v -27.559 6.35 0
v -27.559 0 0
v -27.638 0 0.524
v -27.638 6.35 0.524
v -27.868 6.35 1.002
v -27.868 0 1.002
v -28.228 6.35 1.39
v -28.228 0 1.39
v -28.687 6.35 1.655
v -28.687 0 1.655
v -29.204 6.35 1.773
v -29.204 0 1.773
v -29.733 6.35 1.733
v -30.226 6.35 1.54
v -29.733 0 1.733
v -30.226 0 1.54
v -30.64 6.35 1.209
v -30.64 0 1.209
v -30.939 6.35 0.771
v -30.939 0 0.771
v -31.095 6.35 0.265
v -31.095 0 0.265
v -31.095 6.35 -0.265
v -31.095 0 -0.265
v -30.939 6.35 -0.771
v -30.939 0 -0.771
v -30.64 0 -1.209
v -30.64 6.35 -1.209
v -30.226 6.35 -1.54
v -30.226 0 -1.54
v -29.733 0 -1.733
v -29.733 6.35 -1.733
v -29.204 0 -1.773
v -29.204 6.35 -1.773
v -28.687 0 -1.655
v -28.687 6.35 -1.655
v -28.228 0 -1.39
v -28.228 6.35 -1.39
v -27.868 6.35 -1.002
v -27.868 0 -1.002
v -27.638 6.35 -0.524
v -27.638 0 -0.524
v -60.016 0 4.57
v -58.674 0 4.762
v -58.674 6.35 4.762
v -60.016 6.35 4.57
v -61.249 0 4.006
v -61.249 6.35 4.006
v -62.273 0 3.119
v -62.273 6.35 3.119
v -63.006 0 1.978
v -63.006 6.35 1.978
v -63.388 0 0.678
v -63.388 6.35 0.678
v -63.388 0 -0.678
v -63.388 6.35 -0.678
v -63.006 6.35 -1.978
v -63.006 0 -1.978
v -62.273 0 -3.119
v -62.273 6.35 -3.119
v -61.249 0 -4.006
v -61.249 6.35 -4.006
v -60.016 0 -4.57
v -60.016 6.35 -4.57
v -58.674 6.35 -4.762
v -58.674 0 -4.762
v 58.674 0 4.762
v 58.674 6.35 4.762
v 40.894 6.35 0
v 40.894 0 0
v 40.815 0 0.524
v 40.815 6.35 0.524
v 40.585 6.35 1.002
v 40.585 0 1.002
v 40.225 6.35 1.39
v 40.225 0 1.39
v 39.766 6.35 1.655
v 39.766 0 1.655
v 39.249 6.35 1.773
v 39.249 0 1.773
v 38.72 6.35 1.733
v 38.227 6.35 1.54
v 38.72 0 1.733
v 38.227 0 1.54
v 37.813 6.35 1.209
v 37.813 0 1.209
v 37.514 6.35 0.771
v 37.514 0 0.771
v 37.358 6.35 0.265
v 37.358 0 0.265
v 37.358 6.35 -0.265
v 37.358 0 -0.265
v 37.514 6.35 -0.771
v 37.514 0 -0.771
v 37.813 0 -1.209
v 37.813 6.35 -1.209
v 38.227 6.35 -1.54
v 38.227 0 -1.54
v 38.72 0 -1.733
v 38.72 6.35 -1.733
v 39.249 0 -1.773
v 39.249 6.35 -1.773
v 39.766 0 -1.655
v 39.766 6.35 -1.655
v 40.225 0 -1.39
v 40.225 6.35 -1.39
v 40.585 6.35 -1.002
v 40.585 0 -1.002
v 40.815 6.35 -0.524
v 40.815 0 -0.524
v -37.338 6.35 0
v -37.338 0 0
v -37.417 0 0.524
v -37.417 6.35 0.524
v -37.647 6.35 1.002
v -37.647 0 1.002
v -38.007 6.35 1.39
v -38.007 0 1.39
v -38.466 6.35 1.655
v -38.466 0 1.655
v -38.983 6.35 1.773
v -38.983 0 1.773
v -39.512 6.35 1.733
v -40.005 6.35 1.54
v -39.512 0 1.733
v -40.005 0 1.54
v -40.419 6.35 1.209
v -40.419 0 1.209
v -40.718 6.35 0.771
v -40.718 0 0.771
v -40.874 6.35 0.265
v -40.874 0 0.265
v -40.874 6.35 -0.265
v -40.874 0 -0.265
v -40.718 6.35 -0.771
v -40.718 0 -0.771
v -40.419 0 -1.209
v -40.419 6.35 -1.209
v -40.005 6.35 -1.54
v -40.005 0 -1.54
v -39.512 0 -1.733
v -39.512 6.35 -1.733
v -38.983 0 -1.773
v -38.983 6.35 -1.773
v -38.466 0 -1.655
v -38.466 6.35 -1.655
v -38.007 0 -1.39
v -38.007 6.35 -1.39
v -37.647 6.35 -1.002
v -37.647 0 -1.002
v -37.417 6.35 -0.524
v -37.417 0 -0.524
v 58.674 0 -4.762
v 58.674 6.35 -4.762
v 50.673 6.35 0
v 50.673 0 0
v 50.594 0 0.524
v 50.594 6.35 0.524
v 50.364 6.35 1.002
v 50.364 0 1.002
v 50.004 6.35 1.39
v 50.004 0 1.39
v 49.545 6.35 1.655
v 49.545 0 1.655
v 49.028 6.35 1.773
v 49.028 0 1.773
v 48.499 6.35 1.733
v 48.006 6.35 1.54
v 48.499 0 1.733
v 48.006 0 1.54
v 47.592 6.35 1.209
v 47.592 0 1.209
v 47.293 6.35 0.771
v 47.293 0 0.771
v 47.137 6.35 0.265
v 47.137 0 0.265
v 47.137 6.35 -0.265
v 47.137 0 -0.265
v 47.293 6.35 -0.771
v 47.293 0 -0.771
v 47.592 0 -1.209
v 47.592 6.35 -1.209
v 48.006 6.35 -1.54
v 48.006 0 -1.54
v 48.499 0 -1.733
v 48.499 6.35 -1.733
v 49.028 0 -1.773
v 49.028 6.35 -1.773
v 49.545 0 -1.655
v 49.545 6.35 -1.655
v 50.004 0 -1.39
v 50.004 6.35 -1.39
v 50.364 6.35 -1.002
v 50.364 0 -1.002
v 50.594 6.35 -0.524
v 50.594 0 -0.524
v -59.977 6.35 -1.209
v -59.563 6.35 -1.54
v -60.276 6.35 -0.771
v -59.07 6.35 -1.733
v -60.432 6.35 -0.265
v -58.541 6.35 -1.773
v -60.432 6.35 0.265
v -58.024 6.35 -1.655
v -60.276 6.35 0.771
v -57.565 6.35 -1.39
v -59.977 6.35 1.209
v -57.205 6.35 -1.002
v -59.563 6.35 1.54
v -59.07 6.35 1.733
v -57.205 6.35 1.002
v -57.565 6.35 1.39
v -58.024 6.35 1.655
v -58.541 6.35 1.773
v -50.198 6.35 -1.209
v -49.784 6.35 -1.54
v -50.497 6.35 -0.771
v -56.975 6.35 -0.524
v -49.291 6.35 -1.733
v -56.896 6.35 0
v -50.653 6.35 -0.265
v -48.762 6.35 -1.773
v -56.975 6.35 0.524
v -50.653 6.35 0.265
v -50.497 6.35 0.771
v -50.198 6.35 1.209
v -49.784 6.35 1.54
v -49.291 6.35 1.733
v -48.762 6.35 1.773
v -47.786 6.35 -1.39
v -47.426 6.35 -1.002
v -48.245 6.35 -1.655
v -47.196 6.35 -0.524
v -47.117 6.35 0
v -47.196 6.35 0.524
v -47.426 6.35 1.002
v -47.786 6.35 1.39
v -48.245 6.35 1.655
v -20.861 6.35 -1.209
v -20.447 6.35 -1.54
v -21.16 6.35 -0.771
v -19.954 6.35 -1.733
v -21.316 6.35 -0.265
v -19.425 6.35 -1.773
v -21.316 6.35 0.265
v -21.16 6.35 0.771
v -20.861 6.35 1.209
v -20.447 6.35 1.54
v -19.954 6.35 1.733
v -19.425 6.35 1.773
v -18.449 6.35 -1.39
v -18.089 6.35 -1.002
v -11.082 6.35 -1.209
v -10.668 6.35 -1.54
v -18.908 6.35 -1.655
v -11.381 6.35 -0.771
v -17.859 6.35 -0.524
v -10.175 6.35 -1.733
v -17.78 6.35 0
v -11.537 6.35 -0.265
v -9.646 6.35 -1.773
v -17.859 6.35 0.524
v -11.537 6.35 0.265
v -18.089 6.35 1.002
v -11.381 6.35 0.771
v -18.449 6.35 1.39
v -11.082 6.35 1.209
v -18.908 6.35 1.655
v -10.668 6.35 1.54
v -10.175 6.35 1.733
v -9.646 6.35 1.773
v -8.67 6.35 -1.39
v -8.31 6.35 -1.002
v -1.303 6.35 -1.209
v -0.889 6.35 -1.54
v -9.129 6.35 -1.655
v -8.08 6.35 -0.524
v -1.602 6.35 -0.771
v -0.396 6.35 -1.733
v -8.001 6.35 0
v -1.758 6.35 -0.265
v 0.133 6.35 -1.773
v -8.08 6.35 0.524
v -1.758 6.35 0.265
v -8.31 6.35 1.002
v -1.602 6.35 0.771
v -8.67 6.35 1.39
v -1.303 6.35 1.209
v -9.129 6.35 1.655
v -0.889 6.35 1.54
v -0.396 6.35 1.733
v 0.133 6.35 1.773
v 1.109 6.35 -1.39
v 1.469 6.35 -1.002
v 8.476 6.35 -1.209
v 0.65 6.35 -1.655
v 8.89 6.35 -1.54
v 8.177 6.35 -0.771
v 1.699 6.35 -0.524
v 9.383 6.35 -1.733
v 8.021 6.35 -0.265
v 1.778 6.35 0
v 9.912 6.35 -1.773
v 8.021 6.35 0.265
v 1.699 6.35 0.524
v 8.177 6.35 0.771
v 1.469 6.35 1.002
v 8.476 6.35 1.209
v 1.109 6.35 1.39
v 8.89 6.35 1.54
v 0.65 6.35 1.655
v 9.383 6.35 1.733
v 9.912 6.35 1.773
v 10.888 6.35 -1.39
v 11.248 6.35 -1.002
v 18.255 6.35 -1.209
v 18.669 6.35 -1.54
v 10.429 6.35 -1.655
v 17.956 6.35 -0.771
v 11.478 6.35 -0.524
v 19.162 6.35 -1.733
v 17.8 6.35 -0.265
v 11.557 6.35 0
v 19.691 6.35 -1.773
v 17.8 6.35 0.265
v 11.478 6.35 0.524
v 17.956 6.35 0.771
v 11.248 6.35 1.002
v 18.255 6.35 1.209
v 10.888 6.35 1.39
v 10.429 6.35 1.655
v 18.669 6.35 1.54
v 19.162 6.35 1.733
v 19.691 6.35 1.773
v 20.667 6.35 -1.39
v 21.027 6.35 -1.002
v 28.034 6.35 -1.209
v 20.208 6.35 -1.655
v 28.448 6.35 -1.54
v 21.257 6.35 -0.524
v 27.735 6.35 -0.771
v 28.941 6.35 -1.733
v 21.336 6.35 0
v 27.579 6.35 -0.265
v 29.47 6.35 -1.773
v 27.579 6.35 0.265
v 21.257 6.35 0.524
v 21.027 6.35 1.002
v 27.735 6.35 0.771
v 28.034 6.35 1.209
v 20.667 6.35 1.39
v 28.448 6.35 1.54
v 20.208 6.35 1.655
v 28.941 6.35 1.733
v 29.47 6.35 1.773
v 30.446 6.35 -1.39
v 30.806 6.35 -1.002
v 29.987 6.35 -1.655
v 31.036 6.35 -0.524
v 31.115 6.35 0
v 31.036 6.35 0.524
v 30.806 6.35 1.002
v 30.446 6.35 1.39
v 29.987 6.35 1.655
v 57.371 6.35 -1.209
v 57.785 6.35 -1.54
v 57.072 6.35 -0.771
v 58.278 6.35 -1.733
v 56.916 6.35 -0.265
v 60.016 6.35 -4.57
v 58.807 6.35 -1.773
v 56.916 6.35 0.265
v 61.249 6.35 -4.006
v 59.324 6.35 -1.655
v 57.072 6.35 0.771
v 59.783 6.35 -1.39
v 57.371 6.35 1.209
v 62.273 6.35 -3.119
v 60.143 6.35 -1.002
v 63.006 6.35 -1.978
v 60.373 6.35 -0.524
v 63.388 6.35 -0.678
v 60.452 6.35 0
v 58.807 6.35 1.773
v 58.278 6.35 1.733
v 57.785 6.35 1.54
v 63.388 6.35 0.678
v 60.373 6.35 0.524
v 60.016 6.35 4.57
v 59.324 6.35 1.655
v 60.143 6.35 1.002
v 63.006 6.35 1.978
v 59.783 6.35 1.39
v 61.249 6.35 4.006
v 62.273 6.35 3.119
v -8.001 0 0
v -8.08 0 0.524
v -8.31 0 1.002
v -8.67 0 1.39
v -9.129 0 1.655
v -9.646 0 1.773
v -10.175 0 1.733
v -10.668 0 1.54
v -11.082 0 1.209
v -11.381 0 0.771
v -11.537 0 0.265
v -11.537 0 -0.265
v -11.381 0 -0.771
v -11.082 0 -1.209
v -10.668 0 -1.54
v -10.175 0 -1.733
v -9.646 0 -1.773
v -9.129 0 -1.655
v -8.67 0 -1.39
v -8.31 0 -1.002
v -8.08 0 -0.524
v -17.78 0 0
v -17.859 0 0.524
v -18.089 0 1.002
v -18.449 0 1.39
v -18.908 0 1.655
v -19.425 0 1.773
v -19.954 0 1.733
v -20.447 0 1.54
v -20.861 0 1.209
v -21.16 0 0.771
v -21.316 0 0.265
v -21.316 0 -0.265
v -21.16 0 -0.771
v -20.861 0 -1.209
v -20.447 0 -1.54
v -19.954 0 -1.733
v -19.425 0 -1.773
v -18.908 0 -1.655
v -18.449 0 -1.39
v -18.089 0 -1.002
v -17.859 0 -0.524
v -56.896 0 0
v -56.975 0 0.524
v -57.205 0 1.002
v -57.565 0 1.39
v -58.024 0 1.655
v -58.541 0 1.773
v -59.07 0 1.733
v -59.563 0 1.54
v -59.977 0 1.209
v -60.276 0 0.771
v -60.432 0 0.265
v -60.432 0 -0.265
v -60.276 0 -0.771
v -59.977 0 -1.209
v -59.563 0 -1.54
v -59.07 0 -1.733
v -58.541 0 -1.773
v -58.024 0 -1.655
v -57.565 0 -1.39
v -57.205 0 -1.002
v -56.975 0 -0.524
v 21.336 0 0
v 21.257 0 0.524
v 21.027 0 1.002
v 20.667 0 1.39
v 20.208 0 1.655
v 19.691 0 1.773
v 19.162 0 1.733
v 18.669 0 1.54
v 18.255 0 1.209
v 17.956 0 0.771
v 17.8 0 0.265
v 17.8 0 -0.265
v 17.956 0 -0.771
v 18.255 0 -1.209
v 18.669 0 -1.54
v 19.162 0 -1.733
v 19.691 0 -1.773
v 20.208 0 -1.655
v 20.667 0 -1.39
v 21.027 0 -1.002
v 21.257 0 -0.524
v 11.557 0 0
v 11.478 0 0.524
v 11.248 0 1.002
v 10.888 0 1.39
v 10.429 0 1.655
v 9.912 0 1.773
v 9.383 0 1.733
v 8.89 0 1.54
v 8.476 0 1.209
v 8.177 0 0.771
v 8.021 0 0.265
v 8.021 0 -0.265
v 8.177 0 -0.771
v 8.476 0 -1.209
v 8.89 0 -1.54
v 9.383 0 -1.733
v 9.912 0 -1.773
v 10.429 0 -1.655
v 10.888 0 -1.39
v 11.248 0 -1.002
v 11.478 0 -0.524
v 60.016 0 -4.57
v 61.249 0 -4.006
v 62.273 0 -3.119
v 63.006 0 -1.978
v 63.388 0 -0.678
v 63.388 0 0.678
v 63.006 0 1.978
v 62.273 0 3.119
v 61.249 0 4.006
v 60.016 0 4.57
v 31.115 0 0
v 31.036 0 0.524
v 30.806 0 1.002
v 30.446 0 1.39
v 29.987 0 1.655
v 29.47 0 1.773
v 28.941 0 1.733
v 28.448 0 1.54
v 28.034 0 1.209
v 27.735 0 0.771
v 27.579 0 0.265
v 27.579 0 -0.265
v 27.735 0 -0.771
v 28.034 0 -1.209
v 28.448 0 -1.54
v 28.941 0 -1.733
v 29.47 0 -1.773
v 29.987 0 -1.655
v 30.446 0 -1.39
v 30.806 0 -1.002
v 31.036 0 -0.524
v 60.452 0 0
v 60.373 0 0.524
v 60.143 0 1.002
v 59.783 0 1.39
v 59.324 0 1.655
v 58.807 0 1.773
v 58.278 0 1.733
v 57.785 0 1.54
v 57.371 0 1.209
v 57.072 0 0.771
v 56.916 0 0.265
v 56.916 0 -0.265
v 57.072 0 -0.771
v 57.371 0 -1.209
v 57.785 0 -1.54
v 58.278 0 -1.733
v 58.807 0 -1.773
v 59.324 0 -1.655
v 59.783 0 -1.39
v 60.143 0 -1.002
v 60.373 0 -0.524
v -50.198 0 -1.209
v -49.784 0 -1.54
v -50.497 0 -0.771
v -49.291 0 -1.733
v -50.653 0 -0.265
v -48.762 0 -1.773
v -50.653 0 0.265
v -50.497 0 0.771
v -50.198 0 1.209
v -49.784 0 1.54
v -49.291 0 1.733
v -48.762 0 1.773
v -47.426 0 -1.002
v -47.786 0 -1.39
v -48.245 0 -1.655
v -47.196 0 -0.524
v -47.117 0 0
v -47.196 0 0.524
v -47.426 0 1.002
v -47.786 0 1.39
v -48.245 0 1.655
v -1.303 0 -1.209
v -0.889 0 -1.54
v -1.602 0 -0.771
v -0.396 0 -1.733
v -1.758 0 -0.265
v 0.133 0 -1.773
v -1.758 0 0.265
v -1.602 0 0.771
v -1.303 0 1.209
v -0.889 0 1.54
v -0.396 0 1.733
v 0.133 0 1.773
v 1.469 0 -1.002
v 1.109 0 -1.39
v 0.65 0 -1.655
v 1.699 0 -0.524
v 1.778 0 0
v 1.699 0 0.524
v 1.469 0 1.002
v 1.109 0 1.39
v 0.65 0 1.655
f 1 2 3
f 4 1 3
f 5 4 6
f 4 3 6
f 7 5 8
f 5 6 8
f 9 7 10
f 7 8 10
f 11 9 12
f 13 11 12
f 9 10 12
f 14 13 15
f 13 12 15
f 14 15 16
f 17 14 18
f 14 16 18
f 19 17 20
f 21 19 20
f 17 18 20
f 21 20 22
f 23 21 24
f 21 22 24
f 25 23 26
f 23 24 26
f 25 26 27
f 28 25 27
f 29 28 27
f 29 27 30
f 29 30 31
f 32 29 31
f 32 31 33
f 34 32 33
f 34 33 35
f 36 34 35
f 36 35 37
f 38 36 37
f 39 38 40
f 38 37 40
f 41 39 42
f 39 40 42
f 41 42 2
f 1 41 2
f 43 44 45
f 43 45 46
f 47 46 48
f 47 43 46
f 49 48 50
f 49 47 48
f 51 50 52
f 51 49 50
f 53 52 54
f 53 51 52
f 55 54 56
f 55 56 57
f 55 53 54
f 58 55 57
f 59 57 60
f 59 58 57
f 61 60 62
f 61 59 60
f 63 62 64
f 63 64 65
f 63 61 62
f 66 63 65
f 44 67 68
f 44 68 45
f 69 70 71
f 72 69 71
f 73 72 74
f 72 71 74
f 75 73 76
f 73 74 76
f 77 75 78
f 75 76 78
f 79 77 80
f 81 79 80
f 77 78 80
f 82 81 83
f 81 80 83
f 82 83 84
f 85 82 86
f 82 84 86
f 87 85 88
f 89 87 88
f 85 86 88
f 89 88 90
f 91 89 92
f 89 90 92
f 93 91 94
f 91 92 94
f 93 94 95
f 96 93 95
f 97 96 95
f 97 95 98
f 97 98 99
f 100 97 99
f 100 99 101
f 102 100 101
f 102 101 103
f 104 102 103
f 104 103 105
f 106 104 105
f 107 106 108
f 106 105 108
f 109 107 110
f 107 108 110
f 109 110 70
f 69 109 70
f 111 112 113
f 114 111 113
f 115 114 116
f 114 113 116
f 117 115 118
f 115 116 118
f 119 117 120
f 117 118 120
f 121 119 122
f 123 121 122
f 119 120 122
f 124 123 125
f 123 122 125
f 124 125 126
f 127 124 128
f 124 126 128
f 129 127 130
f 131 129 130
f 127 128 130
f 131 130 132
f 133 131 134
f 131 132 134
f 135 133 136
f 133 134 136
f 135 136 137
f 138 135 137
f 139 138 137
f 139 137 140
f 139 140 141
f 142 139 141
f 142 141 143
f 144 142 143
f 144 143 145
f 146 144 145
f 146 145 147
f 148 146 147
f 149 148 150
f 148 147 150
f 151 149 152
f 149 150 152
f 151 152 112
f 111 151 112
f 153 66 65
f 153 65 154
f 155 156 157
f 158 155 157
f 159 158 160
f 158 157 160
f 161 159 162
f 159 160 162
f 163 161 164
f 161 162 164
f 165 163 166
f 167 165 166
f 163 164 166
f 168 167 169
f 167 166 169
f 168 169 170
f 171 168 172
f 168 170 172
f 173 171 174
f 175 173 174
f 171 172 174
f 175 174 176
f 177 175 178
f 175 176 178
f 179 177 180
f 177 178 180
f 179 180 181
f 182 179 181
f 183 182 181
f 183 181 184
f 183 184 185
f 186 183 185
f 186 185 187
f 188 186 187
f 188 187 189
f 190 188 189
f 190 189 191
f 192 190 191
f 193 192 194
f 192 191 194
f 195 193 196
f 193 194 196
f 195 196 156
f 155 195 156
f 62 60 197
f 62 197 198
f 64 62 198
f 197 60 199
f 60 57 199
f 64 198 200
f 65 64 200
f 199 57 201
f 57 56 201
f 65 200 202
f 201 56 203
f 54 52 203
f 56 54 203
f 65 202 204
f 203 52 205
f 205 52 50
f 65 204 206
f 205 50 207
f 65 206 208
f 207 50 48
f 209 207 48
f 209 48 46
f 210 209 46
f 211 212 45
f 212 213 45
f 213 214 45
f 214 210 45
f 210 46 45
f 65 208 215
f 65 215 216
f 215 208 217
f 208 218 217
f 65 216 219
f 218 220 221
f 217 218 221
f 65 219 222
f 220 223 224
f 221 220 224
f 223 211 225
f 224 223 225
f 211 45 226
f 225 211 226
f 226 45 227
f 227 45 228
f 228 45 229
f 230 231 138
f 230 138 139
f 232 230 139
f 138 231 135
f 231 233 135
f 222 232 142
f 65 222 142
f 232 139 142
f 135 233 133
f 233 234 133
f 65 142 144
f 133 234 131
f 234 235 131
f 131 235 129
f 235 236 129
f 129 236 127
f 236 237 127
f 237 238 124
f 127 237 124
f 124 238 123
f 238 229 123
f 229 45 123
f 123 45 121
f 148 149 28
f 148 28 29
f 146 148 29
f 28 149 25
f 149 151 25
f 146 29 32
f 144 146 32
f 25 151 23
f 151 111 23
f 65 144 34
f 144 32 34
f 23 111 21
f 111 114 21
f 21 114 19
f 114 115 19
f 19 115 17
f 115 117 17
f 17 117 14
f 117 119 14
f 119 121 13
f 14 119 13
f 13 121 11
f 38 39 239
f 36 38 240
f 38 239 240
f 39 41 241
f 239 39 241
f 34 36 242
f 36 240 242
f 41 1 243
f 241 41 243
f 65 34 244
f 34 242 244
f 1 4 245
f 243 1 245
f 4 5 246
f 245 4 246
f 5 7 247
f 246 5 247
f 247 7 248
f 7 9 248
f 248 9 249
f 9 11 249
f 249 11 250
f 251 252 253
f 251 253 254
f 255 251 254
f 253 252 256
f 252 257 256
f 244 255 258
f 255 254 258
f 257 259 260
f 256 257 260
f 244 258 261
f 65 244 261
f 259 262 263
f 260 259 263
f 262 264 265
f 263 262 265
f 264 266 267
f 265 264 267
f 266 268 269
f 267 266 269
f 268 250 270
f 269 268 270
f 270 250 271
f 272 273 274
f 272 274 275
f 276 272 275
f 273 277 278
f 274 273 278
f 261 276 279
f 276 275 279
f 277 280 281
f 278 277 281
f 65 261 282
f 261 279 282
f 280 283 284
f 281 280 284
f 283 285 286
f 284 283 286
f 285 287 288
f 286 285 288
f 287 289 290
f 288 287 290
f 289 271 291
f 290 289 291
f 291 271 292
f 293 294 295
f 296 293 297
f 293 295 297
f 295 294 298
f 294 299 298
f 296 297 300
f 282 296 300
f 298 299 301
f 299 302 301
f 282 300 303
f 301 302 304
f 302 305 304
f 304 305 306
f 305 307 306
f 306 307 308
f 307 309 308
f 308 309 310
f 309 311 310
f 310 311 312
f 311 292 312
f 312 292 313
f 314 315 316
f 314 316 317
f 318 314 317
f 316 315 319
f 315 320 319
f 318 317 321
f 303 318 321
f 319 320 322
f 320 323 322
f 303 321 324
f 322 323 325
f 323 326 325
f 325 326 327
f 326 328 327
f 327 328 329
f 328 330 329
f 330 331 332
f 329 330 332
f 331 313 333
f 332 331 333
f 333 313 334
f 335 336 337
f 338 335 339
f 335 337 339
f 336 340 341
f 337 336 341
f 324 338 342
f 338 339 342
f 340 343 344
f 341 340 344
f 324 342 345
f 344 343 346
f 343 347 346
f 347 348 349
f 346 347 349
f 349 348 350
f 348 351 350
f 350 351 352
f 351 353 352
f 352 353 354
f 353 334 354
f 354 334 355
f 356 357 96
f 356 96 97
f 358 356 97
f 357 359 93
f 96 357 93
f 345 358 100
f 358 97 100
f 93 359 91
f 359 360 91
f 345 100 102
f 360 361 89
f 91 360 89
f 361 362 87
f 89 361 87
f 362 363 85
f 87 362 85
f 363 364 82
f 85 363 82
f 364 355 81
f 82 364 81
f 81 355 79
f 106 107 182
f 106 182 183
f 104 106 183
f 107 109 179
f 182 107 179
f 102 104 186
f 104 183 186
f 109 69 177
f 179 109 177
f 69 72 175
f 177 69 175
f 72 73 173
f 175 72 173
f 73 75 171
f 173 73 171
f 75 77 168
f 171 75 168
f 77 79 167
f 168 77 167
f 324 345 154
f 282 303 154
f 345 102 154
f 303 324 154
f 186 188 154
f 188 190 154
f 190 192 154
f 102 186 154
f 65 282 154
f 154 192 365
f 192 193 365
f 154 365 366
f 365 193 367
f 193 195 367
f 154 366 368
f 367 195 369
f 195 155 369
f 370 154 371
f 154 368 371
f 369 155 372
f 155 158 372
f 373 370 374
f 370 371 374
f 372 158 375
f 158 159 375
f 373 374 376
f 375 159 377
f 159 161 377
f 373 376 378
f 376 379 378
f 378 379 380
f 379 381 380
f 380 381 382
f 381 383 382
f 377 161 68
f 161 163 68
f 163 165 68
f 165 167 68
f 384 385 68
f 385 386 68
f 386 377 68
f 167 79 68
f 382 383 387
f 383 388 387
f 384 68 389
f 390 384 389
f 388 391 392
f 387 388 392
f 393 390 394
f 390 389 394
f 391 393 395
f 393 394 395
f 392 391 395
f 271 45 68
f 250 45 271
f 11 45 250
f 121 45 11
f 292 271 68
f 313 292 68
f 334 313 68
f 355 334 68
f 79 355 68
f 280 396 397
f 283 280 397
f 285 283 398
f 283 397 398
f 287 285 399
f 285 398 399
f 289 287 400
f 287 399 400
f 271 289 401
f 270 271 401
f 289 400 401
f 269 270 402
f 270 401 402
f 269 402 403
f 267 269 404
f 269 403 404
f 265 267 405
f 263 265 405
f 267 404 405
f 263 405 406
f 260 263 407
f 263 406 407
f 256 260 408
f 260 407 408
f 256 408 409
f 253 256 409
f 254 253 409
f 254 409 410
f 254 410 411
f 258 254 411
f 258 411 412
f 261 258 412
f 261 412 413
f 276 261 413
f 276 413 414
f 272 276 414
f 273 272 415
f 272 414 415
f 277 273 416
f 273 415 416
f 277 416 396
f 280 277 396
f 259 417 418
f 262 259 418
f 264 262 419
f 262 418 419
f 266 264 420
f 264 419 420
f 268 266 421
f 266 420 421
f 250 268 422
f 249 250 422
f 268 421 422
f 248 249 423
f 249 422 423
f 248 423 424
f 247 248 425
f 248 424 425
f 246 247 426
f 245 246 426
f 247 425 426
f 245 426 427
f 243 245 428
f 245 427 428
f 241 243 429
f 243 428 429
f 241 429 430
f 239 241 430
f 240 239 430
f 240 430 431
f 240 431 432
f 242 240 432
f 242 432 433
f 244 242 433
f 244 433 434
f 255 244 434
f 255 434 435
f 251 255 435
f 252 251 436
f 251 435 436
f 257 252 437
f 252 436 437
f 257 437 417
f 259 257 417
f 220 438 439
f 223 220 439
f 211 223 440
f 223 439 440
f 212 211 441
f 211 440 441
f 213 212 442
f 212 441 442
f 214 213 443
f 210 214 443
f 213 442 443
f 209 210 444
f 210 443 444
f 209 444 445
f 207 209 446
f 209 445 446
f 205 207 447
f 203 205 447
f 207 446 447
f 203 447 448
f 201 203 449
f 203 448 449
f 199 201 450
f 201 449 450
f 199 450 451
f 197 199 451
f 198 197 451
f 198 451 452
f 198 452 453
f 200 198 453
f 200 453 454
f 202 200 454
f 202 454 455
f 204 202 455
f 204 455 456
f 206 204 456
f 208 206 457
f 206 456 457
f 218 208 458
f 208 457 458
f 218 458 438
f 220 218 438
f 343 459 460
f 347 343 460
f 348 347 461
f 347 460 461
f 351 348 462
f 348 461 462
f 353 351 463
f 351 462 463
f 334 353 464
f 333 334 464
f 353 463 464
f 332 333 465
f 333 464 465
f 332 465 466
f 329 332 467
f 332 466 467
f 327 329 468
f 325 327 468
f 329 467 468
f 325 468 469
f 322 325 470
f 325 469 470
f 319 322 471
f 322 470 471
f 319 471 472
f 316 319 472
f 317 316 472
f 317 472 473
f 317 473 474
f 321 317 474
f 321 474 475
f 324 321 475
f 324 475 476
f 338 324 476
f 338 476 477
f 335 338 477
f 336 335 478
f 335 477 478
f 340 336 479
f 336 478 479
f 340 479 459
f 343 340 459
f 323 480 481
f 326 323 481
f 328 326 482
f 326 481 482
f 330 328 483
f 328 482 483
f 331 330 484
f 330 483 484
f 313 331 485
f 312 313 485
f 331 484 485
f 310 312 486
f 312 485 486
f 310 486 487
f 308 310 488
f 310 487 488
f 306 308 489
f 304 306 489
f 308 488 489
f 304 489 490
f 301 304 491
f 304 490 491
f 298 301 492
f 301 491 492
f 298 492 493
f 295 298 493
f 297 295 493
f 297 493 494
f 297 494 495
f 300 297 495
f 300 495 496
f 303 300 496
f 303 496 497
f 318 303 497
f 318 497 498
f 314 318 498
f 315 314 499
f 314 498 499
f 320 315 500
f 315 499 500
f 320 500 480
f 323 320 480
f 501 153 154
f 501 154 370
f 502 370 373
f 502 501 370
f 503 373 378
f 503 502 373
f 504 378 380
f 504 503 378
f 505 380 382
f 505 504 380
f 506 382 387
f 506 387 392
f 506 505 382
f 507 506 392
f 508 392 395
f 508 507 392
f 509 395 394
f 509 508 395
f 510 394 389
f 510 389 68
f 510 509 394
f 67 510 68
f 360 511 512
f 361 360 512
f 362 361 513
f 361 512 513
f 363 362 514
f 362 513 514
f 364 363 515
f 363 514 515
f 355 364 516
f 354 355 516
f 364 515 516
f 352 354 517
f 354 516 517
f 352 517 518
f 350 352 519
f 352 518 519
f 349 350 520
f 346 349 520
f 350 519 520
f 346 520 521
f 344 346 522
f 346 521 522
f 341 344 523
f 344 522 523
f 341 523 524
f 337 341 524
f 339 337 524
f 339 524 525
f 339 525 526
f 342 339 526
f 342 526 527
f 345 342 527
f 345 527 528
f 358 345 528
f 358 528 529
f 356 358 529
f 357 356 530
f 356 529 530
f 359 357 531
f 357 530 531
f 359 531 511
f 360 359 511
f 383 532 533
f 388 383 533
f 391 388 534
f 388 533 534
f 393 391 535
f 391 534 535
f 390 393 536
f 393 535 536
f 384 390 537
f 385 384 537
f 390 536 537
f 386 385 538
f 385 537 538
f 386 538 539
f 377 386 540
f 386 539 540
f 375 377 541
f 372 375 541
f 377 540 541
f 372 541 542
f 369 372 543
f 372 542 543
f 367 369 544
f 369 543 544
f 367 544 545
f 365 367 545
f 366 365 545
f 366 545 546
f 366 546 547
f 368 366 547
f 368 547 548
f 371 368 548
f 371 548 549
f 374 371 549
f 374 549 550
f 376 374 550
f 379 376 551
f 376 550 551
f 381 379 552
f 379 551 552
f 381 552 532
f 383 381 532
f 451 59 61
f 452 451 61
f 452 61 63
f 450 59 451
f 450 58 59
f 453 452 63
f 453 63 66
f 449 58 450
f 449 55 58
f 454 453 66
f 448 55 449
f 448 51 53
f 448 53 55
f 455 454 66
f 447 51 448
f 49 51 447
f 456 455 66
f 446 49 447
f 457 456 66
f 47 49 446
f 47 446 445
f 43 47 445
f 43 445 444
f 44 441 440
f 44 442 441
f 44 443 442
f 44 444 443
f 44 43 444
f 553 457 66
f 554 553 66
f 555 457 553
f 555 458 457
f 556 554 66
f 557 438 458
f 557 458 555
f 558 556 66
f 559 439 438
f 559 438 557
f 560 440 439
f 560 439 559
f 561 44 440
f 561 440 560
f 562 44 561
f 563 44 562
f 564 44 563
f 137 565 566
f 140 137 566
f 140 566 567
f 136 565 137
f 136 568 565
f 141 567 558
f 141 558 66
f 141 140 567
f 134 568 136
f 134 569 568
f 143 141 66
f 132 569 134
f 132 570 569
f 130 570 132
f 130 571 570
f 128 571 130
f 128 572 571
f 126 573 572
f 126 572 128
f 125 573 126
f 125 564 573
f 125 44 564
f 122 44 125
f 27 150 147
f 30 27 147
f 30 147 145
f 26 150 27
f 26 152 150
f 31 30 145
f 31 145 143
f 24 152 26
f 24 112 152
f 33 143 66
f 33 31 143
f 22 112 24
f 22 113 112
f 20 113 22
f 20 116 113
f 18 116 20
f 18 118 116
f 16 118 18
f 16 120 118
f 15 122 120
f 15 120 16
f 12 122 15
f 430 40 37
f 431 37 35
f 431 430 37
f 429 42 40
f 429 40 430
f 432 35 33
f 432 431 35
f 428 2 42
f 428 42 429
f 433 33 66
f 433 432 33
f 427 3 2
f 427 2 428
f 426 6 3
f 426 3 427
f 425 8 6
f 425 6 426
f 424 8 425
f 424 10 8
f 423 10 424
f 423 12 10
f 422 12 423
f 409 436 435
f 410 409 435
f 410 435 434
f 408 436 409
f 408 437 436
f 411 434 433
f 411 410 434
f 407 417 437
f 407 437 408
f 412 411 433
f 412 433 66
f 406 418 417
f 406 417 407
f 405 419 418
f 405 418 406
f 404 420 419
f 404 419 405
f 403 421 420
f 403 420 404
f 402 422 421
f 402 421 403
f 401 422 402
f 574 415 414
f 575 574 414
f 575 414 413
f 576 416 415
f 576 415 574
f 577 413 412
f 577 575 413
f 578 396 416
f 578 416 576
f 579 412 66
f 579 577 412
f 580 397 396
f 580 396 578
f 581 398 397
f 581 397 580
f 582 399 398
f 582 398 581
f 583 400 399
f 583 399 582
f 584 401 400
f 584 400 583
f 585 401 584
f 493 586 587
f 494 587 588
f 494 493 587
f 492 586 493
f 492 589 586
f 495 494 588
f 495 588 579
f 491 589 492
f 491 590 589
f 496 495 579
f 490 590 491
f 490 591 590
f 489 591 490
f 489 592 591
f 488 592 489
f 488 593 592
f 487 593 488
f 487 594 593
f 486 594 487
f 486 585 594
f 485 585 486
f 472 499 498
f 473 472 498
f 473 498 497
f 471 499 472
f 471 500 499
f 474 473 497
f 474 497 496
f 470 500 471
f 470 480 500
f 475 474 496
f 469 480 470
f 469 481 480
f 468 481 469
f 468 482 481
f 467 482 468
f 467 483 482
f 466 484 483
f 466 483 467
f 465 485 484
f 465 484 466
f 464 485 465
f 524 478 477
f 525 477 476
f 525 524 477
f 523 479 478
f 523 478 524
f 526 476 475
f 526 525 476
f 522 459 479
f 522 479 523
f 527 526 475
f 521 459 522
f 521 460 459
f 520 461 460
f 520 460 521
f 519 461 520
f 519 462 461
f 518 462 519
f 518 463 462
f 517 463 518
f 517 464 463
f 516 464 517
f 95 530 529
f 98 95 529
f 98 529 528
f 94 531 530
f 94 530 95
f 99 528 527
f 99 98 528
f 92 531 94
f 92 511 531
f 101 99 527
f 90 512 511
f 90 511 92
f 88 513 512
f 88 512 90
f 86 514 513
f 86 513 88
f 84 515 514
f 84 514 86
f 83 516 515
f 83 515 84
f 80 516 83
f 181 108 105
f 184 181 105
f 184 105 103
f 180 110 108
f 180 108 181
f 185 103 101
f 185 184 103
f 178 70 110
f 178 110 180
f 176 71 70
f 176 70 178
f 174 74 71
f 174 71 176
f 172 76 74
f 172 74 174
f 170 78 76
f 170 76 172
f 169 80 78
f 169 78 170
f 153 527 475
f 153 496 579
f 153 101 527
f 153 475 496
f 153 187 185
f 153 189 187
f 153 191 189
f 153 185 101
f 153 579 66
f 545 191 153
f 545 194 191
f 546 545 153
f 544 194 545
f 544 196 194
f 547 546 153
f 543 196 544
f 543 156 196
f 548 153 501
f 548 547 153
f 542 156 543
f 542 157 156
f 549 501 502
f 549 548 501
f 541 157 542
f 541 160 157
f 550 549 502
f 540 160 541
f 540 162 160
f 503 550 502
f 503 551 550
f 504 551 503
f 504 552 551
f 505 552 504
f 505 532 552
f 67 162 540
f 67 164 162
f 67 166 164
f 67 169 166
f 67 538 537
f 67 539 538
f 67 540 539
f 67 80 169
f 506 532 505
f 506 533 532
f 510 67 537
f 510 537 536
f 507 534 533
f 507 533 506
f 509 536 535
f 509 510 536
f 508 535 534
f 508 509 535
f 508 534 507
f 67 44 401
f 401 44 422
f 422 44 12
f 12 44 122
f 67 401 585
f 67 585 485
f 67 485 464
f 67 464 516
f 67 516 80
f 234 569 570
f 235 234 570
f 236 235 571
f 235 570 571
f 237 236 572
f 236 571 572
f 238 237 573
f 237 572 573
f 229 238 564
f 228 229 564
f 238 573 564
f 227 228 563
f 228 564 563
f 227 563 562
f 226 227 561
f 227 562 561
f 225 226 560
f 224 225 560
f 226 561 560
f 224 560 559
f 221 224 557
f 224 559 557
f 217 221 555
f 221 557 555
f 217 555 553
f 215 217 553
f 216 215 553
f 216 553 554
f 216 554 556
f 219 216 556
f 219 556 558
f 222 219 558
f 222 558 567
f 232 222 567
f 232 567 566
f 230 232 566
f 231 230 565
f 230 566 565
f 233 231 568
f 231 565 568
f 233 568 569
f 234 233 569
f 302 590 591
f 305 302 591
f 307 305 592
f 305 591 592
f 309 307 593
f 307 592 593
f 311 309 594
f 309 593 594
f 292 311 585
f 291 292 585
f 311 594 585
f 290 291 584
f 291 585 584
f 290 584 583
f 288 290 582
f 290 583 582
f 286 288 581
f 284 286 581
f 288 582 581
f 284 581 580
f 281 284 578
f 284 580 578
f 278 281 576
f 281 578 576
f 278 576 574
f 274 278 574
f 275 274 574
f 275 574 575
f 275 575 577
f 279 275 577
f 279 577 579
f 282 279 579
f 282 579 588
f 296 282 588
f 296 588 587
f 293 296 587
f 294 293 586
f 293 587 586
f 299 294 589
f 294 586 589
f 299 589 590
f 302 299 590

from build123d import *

# Parameters (mm, degrees)
SKETCH1_R           = 1.778
BOSS_EXTRUDE1_DEPTH = 6.35


with BuildPart() as part:
    # Sketch1 → Boss-Extrude1 (new body)
    with BuildSketch(Plane.XZ):
        with BuildLine():
            Line((-58.674, -4.7625), (58.674, -4.7625))
            ThreePointArc((58.674, -4.7625), (63.4365, 0), (58.674, 4.7625))
            Line((58.674, 4.7625), (-58.674, 4.7625))
            ThreePointArc((-58.674, 4.7625), (-63.4365, 0), (-58.674, -4.7625))
        make_face()
        with Locations((58.674, 0)):
            Circle(SKETCH1_R, mode=Mode.SUBTRACT)
        with Locations((48.895, 0)):
            Circle(SKETCH1_R, mode=Mode.SUBTRACT)
        with Locations((39.116, 0)):
            Circle(SKETCH1_R, mode=Mode.SUBTRACT)
        with Locations((29.337, 0)):
            Circle(SKETCH1_R, mode=Mode.SUBTRACT)
        with Locations((19.558, 0)):
            Circle(SKETCH1_R, mode=Mode.SUBTRACT)
        with Locations((9.779, 0)):
            Circle(SKETCH1_R, mode=Mode.SUBTRACT)
        Circle(SKETCH1_R, mode=Mode.SUBTRACT)
        with Locations((-9.779, 0)):
            Circle(SKETCH1_R, mode=Mode.SUBTRACT)
        with Locations((-19.558, 0)):
            Circle(SKETCH1_R, mode=Mode.SUBTRACT)
        with Locations((-29.337, 0)):
            Circle(SKETCH1_R, mode=Mode.SUBTRACT)
        with Locations((-39.116, 0)):
            Circle(SKETCH1_R, mode=Mode.SUBTRACT)
        with Locations((-48.895, 0)):
            Circle(SKETCH1_R, mode=Mode.SUBTRACT)
        with Locations((-58.674, 0)):
            Circle(SKETCH1_R, mode=Mode.SUBTRACT)
    extrude(amount=-BOSS_EXTRUDE1_DEPTH)


solid = part.part
